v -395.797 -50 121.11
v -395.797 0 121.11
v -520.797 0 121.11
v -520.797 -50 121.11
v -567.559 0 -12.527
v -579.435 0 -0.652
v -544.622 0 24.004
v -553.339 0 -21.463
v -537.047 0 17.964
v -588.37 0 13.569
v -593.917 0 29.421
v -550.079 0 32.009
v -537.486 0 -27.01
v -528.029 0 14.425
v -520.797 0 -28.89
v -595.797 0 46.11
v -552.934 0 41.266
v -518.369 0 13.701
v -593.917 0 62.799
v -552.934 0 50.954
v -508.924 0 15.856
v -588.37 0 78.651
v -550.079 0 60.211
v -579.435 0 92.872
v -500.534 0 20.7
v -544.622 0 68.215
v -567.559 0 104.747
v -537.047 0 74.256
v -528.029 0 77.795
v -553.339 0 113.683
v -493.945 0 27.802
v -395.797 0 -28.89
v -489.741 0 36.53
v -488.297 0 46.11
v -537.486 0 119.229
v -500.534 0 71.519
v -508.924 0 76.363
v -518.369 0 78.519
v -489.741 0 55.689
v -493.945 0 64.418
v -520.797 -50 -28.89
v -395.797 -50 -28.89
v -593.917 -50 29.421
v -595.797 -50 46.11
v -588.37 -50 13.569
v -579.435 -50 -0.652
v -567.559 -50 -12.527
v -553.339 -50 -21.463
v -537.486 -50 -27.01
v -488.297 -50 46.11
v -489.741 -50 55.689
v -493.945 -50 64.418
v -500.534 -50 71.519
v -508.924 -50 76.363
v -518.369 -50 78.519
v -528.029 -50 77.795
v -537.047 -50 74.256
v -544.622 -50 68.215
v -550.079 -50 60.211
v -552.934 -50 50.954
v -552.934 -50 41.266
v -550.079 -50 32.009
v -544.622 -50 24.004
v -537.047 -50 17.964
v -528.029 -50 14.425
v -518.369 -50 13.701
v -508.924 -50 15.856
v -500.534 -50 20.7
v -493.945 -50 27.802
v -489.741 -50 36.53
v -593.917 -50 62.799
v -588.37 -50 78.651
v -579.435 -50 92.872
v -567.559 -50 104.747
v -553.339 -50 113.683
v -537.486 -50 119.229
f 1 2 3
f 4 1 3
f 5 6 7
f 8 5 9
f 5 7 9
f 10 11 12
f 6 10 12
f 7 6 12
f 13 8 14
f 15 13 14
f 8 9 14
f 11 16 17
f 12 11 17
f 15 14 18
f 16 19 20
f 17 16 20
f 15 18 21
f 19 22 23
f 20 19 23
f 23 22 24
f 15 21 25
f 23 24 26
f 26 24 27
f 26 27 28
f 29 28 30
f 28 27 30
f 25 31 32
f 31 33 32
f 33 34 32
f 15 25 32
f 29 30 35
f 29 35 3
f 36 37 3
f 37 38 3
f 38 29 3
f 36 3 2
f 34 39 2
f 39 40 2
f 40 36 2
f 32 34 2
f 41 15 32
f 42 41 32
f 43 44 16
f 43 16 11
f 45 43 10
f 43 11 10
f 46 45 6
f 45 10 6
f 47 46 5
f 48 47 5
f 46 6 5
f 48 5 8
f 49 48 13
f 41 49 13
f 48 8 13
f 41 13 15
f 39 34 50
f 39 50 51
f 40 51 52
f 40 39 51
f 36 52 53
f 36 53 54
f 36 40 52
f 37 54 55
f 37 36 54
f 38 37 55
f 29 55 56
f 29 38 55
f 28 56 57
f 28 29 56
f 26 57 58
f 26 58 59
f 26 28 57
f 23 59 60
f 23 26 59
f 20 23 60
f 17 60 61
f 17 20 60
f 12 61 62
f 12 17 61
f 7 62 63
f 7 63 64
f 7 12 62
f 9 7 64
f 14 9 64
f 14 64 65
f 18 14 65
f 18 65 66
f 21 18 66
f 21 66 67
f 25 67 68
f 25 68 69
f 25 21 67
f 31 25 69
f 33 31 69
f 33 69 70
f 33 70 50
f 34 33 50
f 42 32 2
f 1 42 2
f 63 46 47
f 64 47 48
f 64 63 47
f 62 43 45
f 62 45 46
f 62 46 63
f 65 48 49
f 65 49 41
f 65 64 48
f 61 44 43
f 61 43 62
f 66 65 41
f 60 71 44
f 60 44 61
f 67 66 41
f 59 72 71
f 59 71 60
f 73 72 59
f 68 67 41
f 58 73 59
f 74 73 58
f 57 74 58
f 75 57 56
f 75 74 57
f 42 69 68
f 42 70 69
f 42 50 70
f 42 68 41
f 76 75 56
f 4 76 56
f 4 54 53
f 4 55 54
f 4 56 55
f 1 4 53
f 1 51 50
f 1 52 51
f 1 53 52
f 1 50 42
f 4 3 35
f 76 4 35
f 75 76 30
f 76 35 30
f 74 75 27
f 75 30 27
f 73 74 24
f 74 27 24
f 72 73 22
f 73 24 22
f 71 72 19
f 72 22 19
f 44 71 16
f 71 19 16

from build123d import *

# Parameters (mm, degrees)
F0_R     = 32.5
F1_DEPTH = 50


with BuildPart() as f1:
    # F0 (on Front) → F1 (new body)
    with BuildSketch(Plane.XZ):
        with BuildLine():
            Line((-395.797376, 46.109863), (-395.797376, 121.109863))
            Line((-395.797376, 121.109863), (-520.797376, 121.109863))
            ThreePointArc((-520.797376, 121.109863), (-573.830384, 99.142871), (-595.797376, 46.109863))
            ThreePointArc((-595.797376, 46.109863), (-573.830384, -6.923146), (-520.797376, -28.890137))
            Line((-520.797376, -28.890137), (-395.797376, -28.890137))
            Line((-395.797376, -28.890137), (-395.797376, 46.109863))
        make_face()
        with Locations((-520.797376, 46.109863)):
            Circle(F0_R, mode=Mode.SUBTRACT)
    extrude(amount=F1_DEPTH)


solid = f1.part
